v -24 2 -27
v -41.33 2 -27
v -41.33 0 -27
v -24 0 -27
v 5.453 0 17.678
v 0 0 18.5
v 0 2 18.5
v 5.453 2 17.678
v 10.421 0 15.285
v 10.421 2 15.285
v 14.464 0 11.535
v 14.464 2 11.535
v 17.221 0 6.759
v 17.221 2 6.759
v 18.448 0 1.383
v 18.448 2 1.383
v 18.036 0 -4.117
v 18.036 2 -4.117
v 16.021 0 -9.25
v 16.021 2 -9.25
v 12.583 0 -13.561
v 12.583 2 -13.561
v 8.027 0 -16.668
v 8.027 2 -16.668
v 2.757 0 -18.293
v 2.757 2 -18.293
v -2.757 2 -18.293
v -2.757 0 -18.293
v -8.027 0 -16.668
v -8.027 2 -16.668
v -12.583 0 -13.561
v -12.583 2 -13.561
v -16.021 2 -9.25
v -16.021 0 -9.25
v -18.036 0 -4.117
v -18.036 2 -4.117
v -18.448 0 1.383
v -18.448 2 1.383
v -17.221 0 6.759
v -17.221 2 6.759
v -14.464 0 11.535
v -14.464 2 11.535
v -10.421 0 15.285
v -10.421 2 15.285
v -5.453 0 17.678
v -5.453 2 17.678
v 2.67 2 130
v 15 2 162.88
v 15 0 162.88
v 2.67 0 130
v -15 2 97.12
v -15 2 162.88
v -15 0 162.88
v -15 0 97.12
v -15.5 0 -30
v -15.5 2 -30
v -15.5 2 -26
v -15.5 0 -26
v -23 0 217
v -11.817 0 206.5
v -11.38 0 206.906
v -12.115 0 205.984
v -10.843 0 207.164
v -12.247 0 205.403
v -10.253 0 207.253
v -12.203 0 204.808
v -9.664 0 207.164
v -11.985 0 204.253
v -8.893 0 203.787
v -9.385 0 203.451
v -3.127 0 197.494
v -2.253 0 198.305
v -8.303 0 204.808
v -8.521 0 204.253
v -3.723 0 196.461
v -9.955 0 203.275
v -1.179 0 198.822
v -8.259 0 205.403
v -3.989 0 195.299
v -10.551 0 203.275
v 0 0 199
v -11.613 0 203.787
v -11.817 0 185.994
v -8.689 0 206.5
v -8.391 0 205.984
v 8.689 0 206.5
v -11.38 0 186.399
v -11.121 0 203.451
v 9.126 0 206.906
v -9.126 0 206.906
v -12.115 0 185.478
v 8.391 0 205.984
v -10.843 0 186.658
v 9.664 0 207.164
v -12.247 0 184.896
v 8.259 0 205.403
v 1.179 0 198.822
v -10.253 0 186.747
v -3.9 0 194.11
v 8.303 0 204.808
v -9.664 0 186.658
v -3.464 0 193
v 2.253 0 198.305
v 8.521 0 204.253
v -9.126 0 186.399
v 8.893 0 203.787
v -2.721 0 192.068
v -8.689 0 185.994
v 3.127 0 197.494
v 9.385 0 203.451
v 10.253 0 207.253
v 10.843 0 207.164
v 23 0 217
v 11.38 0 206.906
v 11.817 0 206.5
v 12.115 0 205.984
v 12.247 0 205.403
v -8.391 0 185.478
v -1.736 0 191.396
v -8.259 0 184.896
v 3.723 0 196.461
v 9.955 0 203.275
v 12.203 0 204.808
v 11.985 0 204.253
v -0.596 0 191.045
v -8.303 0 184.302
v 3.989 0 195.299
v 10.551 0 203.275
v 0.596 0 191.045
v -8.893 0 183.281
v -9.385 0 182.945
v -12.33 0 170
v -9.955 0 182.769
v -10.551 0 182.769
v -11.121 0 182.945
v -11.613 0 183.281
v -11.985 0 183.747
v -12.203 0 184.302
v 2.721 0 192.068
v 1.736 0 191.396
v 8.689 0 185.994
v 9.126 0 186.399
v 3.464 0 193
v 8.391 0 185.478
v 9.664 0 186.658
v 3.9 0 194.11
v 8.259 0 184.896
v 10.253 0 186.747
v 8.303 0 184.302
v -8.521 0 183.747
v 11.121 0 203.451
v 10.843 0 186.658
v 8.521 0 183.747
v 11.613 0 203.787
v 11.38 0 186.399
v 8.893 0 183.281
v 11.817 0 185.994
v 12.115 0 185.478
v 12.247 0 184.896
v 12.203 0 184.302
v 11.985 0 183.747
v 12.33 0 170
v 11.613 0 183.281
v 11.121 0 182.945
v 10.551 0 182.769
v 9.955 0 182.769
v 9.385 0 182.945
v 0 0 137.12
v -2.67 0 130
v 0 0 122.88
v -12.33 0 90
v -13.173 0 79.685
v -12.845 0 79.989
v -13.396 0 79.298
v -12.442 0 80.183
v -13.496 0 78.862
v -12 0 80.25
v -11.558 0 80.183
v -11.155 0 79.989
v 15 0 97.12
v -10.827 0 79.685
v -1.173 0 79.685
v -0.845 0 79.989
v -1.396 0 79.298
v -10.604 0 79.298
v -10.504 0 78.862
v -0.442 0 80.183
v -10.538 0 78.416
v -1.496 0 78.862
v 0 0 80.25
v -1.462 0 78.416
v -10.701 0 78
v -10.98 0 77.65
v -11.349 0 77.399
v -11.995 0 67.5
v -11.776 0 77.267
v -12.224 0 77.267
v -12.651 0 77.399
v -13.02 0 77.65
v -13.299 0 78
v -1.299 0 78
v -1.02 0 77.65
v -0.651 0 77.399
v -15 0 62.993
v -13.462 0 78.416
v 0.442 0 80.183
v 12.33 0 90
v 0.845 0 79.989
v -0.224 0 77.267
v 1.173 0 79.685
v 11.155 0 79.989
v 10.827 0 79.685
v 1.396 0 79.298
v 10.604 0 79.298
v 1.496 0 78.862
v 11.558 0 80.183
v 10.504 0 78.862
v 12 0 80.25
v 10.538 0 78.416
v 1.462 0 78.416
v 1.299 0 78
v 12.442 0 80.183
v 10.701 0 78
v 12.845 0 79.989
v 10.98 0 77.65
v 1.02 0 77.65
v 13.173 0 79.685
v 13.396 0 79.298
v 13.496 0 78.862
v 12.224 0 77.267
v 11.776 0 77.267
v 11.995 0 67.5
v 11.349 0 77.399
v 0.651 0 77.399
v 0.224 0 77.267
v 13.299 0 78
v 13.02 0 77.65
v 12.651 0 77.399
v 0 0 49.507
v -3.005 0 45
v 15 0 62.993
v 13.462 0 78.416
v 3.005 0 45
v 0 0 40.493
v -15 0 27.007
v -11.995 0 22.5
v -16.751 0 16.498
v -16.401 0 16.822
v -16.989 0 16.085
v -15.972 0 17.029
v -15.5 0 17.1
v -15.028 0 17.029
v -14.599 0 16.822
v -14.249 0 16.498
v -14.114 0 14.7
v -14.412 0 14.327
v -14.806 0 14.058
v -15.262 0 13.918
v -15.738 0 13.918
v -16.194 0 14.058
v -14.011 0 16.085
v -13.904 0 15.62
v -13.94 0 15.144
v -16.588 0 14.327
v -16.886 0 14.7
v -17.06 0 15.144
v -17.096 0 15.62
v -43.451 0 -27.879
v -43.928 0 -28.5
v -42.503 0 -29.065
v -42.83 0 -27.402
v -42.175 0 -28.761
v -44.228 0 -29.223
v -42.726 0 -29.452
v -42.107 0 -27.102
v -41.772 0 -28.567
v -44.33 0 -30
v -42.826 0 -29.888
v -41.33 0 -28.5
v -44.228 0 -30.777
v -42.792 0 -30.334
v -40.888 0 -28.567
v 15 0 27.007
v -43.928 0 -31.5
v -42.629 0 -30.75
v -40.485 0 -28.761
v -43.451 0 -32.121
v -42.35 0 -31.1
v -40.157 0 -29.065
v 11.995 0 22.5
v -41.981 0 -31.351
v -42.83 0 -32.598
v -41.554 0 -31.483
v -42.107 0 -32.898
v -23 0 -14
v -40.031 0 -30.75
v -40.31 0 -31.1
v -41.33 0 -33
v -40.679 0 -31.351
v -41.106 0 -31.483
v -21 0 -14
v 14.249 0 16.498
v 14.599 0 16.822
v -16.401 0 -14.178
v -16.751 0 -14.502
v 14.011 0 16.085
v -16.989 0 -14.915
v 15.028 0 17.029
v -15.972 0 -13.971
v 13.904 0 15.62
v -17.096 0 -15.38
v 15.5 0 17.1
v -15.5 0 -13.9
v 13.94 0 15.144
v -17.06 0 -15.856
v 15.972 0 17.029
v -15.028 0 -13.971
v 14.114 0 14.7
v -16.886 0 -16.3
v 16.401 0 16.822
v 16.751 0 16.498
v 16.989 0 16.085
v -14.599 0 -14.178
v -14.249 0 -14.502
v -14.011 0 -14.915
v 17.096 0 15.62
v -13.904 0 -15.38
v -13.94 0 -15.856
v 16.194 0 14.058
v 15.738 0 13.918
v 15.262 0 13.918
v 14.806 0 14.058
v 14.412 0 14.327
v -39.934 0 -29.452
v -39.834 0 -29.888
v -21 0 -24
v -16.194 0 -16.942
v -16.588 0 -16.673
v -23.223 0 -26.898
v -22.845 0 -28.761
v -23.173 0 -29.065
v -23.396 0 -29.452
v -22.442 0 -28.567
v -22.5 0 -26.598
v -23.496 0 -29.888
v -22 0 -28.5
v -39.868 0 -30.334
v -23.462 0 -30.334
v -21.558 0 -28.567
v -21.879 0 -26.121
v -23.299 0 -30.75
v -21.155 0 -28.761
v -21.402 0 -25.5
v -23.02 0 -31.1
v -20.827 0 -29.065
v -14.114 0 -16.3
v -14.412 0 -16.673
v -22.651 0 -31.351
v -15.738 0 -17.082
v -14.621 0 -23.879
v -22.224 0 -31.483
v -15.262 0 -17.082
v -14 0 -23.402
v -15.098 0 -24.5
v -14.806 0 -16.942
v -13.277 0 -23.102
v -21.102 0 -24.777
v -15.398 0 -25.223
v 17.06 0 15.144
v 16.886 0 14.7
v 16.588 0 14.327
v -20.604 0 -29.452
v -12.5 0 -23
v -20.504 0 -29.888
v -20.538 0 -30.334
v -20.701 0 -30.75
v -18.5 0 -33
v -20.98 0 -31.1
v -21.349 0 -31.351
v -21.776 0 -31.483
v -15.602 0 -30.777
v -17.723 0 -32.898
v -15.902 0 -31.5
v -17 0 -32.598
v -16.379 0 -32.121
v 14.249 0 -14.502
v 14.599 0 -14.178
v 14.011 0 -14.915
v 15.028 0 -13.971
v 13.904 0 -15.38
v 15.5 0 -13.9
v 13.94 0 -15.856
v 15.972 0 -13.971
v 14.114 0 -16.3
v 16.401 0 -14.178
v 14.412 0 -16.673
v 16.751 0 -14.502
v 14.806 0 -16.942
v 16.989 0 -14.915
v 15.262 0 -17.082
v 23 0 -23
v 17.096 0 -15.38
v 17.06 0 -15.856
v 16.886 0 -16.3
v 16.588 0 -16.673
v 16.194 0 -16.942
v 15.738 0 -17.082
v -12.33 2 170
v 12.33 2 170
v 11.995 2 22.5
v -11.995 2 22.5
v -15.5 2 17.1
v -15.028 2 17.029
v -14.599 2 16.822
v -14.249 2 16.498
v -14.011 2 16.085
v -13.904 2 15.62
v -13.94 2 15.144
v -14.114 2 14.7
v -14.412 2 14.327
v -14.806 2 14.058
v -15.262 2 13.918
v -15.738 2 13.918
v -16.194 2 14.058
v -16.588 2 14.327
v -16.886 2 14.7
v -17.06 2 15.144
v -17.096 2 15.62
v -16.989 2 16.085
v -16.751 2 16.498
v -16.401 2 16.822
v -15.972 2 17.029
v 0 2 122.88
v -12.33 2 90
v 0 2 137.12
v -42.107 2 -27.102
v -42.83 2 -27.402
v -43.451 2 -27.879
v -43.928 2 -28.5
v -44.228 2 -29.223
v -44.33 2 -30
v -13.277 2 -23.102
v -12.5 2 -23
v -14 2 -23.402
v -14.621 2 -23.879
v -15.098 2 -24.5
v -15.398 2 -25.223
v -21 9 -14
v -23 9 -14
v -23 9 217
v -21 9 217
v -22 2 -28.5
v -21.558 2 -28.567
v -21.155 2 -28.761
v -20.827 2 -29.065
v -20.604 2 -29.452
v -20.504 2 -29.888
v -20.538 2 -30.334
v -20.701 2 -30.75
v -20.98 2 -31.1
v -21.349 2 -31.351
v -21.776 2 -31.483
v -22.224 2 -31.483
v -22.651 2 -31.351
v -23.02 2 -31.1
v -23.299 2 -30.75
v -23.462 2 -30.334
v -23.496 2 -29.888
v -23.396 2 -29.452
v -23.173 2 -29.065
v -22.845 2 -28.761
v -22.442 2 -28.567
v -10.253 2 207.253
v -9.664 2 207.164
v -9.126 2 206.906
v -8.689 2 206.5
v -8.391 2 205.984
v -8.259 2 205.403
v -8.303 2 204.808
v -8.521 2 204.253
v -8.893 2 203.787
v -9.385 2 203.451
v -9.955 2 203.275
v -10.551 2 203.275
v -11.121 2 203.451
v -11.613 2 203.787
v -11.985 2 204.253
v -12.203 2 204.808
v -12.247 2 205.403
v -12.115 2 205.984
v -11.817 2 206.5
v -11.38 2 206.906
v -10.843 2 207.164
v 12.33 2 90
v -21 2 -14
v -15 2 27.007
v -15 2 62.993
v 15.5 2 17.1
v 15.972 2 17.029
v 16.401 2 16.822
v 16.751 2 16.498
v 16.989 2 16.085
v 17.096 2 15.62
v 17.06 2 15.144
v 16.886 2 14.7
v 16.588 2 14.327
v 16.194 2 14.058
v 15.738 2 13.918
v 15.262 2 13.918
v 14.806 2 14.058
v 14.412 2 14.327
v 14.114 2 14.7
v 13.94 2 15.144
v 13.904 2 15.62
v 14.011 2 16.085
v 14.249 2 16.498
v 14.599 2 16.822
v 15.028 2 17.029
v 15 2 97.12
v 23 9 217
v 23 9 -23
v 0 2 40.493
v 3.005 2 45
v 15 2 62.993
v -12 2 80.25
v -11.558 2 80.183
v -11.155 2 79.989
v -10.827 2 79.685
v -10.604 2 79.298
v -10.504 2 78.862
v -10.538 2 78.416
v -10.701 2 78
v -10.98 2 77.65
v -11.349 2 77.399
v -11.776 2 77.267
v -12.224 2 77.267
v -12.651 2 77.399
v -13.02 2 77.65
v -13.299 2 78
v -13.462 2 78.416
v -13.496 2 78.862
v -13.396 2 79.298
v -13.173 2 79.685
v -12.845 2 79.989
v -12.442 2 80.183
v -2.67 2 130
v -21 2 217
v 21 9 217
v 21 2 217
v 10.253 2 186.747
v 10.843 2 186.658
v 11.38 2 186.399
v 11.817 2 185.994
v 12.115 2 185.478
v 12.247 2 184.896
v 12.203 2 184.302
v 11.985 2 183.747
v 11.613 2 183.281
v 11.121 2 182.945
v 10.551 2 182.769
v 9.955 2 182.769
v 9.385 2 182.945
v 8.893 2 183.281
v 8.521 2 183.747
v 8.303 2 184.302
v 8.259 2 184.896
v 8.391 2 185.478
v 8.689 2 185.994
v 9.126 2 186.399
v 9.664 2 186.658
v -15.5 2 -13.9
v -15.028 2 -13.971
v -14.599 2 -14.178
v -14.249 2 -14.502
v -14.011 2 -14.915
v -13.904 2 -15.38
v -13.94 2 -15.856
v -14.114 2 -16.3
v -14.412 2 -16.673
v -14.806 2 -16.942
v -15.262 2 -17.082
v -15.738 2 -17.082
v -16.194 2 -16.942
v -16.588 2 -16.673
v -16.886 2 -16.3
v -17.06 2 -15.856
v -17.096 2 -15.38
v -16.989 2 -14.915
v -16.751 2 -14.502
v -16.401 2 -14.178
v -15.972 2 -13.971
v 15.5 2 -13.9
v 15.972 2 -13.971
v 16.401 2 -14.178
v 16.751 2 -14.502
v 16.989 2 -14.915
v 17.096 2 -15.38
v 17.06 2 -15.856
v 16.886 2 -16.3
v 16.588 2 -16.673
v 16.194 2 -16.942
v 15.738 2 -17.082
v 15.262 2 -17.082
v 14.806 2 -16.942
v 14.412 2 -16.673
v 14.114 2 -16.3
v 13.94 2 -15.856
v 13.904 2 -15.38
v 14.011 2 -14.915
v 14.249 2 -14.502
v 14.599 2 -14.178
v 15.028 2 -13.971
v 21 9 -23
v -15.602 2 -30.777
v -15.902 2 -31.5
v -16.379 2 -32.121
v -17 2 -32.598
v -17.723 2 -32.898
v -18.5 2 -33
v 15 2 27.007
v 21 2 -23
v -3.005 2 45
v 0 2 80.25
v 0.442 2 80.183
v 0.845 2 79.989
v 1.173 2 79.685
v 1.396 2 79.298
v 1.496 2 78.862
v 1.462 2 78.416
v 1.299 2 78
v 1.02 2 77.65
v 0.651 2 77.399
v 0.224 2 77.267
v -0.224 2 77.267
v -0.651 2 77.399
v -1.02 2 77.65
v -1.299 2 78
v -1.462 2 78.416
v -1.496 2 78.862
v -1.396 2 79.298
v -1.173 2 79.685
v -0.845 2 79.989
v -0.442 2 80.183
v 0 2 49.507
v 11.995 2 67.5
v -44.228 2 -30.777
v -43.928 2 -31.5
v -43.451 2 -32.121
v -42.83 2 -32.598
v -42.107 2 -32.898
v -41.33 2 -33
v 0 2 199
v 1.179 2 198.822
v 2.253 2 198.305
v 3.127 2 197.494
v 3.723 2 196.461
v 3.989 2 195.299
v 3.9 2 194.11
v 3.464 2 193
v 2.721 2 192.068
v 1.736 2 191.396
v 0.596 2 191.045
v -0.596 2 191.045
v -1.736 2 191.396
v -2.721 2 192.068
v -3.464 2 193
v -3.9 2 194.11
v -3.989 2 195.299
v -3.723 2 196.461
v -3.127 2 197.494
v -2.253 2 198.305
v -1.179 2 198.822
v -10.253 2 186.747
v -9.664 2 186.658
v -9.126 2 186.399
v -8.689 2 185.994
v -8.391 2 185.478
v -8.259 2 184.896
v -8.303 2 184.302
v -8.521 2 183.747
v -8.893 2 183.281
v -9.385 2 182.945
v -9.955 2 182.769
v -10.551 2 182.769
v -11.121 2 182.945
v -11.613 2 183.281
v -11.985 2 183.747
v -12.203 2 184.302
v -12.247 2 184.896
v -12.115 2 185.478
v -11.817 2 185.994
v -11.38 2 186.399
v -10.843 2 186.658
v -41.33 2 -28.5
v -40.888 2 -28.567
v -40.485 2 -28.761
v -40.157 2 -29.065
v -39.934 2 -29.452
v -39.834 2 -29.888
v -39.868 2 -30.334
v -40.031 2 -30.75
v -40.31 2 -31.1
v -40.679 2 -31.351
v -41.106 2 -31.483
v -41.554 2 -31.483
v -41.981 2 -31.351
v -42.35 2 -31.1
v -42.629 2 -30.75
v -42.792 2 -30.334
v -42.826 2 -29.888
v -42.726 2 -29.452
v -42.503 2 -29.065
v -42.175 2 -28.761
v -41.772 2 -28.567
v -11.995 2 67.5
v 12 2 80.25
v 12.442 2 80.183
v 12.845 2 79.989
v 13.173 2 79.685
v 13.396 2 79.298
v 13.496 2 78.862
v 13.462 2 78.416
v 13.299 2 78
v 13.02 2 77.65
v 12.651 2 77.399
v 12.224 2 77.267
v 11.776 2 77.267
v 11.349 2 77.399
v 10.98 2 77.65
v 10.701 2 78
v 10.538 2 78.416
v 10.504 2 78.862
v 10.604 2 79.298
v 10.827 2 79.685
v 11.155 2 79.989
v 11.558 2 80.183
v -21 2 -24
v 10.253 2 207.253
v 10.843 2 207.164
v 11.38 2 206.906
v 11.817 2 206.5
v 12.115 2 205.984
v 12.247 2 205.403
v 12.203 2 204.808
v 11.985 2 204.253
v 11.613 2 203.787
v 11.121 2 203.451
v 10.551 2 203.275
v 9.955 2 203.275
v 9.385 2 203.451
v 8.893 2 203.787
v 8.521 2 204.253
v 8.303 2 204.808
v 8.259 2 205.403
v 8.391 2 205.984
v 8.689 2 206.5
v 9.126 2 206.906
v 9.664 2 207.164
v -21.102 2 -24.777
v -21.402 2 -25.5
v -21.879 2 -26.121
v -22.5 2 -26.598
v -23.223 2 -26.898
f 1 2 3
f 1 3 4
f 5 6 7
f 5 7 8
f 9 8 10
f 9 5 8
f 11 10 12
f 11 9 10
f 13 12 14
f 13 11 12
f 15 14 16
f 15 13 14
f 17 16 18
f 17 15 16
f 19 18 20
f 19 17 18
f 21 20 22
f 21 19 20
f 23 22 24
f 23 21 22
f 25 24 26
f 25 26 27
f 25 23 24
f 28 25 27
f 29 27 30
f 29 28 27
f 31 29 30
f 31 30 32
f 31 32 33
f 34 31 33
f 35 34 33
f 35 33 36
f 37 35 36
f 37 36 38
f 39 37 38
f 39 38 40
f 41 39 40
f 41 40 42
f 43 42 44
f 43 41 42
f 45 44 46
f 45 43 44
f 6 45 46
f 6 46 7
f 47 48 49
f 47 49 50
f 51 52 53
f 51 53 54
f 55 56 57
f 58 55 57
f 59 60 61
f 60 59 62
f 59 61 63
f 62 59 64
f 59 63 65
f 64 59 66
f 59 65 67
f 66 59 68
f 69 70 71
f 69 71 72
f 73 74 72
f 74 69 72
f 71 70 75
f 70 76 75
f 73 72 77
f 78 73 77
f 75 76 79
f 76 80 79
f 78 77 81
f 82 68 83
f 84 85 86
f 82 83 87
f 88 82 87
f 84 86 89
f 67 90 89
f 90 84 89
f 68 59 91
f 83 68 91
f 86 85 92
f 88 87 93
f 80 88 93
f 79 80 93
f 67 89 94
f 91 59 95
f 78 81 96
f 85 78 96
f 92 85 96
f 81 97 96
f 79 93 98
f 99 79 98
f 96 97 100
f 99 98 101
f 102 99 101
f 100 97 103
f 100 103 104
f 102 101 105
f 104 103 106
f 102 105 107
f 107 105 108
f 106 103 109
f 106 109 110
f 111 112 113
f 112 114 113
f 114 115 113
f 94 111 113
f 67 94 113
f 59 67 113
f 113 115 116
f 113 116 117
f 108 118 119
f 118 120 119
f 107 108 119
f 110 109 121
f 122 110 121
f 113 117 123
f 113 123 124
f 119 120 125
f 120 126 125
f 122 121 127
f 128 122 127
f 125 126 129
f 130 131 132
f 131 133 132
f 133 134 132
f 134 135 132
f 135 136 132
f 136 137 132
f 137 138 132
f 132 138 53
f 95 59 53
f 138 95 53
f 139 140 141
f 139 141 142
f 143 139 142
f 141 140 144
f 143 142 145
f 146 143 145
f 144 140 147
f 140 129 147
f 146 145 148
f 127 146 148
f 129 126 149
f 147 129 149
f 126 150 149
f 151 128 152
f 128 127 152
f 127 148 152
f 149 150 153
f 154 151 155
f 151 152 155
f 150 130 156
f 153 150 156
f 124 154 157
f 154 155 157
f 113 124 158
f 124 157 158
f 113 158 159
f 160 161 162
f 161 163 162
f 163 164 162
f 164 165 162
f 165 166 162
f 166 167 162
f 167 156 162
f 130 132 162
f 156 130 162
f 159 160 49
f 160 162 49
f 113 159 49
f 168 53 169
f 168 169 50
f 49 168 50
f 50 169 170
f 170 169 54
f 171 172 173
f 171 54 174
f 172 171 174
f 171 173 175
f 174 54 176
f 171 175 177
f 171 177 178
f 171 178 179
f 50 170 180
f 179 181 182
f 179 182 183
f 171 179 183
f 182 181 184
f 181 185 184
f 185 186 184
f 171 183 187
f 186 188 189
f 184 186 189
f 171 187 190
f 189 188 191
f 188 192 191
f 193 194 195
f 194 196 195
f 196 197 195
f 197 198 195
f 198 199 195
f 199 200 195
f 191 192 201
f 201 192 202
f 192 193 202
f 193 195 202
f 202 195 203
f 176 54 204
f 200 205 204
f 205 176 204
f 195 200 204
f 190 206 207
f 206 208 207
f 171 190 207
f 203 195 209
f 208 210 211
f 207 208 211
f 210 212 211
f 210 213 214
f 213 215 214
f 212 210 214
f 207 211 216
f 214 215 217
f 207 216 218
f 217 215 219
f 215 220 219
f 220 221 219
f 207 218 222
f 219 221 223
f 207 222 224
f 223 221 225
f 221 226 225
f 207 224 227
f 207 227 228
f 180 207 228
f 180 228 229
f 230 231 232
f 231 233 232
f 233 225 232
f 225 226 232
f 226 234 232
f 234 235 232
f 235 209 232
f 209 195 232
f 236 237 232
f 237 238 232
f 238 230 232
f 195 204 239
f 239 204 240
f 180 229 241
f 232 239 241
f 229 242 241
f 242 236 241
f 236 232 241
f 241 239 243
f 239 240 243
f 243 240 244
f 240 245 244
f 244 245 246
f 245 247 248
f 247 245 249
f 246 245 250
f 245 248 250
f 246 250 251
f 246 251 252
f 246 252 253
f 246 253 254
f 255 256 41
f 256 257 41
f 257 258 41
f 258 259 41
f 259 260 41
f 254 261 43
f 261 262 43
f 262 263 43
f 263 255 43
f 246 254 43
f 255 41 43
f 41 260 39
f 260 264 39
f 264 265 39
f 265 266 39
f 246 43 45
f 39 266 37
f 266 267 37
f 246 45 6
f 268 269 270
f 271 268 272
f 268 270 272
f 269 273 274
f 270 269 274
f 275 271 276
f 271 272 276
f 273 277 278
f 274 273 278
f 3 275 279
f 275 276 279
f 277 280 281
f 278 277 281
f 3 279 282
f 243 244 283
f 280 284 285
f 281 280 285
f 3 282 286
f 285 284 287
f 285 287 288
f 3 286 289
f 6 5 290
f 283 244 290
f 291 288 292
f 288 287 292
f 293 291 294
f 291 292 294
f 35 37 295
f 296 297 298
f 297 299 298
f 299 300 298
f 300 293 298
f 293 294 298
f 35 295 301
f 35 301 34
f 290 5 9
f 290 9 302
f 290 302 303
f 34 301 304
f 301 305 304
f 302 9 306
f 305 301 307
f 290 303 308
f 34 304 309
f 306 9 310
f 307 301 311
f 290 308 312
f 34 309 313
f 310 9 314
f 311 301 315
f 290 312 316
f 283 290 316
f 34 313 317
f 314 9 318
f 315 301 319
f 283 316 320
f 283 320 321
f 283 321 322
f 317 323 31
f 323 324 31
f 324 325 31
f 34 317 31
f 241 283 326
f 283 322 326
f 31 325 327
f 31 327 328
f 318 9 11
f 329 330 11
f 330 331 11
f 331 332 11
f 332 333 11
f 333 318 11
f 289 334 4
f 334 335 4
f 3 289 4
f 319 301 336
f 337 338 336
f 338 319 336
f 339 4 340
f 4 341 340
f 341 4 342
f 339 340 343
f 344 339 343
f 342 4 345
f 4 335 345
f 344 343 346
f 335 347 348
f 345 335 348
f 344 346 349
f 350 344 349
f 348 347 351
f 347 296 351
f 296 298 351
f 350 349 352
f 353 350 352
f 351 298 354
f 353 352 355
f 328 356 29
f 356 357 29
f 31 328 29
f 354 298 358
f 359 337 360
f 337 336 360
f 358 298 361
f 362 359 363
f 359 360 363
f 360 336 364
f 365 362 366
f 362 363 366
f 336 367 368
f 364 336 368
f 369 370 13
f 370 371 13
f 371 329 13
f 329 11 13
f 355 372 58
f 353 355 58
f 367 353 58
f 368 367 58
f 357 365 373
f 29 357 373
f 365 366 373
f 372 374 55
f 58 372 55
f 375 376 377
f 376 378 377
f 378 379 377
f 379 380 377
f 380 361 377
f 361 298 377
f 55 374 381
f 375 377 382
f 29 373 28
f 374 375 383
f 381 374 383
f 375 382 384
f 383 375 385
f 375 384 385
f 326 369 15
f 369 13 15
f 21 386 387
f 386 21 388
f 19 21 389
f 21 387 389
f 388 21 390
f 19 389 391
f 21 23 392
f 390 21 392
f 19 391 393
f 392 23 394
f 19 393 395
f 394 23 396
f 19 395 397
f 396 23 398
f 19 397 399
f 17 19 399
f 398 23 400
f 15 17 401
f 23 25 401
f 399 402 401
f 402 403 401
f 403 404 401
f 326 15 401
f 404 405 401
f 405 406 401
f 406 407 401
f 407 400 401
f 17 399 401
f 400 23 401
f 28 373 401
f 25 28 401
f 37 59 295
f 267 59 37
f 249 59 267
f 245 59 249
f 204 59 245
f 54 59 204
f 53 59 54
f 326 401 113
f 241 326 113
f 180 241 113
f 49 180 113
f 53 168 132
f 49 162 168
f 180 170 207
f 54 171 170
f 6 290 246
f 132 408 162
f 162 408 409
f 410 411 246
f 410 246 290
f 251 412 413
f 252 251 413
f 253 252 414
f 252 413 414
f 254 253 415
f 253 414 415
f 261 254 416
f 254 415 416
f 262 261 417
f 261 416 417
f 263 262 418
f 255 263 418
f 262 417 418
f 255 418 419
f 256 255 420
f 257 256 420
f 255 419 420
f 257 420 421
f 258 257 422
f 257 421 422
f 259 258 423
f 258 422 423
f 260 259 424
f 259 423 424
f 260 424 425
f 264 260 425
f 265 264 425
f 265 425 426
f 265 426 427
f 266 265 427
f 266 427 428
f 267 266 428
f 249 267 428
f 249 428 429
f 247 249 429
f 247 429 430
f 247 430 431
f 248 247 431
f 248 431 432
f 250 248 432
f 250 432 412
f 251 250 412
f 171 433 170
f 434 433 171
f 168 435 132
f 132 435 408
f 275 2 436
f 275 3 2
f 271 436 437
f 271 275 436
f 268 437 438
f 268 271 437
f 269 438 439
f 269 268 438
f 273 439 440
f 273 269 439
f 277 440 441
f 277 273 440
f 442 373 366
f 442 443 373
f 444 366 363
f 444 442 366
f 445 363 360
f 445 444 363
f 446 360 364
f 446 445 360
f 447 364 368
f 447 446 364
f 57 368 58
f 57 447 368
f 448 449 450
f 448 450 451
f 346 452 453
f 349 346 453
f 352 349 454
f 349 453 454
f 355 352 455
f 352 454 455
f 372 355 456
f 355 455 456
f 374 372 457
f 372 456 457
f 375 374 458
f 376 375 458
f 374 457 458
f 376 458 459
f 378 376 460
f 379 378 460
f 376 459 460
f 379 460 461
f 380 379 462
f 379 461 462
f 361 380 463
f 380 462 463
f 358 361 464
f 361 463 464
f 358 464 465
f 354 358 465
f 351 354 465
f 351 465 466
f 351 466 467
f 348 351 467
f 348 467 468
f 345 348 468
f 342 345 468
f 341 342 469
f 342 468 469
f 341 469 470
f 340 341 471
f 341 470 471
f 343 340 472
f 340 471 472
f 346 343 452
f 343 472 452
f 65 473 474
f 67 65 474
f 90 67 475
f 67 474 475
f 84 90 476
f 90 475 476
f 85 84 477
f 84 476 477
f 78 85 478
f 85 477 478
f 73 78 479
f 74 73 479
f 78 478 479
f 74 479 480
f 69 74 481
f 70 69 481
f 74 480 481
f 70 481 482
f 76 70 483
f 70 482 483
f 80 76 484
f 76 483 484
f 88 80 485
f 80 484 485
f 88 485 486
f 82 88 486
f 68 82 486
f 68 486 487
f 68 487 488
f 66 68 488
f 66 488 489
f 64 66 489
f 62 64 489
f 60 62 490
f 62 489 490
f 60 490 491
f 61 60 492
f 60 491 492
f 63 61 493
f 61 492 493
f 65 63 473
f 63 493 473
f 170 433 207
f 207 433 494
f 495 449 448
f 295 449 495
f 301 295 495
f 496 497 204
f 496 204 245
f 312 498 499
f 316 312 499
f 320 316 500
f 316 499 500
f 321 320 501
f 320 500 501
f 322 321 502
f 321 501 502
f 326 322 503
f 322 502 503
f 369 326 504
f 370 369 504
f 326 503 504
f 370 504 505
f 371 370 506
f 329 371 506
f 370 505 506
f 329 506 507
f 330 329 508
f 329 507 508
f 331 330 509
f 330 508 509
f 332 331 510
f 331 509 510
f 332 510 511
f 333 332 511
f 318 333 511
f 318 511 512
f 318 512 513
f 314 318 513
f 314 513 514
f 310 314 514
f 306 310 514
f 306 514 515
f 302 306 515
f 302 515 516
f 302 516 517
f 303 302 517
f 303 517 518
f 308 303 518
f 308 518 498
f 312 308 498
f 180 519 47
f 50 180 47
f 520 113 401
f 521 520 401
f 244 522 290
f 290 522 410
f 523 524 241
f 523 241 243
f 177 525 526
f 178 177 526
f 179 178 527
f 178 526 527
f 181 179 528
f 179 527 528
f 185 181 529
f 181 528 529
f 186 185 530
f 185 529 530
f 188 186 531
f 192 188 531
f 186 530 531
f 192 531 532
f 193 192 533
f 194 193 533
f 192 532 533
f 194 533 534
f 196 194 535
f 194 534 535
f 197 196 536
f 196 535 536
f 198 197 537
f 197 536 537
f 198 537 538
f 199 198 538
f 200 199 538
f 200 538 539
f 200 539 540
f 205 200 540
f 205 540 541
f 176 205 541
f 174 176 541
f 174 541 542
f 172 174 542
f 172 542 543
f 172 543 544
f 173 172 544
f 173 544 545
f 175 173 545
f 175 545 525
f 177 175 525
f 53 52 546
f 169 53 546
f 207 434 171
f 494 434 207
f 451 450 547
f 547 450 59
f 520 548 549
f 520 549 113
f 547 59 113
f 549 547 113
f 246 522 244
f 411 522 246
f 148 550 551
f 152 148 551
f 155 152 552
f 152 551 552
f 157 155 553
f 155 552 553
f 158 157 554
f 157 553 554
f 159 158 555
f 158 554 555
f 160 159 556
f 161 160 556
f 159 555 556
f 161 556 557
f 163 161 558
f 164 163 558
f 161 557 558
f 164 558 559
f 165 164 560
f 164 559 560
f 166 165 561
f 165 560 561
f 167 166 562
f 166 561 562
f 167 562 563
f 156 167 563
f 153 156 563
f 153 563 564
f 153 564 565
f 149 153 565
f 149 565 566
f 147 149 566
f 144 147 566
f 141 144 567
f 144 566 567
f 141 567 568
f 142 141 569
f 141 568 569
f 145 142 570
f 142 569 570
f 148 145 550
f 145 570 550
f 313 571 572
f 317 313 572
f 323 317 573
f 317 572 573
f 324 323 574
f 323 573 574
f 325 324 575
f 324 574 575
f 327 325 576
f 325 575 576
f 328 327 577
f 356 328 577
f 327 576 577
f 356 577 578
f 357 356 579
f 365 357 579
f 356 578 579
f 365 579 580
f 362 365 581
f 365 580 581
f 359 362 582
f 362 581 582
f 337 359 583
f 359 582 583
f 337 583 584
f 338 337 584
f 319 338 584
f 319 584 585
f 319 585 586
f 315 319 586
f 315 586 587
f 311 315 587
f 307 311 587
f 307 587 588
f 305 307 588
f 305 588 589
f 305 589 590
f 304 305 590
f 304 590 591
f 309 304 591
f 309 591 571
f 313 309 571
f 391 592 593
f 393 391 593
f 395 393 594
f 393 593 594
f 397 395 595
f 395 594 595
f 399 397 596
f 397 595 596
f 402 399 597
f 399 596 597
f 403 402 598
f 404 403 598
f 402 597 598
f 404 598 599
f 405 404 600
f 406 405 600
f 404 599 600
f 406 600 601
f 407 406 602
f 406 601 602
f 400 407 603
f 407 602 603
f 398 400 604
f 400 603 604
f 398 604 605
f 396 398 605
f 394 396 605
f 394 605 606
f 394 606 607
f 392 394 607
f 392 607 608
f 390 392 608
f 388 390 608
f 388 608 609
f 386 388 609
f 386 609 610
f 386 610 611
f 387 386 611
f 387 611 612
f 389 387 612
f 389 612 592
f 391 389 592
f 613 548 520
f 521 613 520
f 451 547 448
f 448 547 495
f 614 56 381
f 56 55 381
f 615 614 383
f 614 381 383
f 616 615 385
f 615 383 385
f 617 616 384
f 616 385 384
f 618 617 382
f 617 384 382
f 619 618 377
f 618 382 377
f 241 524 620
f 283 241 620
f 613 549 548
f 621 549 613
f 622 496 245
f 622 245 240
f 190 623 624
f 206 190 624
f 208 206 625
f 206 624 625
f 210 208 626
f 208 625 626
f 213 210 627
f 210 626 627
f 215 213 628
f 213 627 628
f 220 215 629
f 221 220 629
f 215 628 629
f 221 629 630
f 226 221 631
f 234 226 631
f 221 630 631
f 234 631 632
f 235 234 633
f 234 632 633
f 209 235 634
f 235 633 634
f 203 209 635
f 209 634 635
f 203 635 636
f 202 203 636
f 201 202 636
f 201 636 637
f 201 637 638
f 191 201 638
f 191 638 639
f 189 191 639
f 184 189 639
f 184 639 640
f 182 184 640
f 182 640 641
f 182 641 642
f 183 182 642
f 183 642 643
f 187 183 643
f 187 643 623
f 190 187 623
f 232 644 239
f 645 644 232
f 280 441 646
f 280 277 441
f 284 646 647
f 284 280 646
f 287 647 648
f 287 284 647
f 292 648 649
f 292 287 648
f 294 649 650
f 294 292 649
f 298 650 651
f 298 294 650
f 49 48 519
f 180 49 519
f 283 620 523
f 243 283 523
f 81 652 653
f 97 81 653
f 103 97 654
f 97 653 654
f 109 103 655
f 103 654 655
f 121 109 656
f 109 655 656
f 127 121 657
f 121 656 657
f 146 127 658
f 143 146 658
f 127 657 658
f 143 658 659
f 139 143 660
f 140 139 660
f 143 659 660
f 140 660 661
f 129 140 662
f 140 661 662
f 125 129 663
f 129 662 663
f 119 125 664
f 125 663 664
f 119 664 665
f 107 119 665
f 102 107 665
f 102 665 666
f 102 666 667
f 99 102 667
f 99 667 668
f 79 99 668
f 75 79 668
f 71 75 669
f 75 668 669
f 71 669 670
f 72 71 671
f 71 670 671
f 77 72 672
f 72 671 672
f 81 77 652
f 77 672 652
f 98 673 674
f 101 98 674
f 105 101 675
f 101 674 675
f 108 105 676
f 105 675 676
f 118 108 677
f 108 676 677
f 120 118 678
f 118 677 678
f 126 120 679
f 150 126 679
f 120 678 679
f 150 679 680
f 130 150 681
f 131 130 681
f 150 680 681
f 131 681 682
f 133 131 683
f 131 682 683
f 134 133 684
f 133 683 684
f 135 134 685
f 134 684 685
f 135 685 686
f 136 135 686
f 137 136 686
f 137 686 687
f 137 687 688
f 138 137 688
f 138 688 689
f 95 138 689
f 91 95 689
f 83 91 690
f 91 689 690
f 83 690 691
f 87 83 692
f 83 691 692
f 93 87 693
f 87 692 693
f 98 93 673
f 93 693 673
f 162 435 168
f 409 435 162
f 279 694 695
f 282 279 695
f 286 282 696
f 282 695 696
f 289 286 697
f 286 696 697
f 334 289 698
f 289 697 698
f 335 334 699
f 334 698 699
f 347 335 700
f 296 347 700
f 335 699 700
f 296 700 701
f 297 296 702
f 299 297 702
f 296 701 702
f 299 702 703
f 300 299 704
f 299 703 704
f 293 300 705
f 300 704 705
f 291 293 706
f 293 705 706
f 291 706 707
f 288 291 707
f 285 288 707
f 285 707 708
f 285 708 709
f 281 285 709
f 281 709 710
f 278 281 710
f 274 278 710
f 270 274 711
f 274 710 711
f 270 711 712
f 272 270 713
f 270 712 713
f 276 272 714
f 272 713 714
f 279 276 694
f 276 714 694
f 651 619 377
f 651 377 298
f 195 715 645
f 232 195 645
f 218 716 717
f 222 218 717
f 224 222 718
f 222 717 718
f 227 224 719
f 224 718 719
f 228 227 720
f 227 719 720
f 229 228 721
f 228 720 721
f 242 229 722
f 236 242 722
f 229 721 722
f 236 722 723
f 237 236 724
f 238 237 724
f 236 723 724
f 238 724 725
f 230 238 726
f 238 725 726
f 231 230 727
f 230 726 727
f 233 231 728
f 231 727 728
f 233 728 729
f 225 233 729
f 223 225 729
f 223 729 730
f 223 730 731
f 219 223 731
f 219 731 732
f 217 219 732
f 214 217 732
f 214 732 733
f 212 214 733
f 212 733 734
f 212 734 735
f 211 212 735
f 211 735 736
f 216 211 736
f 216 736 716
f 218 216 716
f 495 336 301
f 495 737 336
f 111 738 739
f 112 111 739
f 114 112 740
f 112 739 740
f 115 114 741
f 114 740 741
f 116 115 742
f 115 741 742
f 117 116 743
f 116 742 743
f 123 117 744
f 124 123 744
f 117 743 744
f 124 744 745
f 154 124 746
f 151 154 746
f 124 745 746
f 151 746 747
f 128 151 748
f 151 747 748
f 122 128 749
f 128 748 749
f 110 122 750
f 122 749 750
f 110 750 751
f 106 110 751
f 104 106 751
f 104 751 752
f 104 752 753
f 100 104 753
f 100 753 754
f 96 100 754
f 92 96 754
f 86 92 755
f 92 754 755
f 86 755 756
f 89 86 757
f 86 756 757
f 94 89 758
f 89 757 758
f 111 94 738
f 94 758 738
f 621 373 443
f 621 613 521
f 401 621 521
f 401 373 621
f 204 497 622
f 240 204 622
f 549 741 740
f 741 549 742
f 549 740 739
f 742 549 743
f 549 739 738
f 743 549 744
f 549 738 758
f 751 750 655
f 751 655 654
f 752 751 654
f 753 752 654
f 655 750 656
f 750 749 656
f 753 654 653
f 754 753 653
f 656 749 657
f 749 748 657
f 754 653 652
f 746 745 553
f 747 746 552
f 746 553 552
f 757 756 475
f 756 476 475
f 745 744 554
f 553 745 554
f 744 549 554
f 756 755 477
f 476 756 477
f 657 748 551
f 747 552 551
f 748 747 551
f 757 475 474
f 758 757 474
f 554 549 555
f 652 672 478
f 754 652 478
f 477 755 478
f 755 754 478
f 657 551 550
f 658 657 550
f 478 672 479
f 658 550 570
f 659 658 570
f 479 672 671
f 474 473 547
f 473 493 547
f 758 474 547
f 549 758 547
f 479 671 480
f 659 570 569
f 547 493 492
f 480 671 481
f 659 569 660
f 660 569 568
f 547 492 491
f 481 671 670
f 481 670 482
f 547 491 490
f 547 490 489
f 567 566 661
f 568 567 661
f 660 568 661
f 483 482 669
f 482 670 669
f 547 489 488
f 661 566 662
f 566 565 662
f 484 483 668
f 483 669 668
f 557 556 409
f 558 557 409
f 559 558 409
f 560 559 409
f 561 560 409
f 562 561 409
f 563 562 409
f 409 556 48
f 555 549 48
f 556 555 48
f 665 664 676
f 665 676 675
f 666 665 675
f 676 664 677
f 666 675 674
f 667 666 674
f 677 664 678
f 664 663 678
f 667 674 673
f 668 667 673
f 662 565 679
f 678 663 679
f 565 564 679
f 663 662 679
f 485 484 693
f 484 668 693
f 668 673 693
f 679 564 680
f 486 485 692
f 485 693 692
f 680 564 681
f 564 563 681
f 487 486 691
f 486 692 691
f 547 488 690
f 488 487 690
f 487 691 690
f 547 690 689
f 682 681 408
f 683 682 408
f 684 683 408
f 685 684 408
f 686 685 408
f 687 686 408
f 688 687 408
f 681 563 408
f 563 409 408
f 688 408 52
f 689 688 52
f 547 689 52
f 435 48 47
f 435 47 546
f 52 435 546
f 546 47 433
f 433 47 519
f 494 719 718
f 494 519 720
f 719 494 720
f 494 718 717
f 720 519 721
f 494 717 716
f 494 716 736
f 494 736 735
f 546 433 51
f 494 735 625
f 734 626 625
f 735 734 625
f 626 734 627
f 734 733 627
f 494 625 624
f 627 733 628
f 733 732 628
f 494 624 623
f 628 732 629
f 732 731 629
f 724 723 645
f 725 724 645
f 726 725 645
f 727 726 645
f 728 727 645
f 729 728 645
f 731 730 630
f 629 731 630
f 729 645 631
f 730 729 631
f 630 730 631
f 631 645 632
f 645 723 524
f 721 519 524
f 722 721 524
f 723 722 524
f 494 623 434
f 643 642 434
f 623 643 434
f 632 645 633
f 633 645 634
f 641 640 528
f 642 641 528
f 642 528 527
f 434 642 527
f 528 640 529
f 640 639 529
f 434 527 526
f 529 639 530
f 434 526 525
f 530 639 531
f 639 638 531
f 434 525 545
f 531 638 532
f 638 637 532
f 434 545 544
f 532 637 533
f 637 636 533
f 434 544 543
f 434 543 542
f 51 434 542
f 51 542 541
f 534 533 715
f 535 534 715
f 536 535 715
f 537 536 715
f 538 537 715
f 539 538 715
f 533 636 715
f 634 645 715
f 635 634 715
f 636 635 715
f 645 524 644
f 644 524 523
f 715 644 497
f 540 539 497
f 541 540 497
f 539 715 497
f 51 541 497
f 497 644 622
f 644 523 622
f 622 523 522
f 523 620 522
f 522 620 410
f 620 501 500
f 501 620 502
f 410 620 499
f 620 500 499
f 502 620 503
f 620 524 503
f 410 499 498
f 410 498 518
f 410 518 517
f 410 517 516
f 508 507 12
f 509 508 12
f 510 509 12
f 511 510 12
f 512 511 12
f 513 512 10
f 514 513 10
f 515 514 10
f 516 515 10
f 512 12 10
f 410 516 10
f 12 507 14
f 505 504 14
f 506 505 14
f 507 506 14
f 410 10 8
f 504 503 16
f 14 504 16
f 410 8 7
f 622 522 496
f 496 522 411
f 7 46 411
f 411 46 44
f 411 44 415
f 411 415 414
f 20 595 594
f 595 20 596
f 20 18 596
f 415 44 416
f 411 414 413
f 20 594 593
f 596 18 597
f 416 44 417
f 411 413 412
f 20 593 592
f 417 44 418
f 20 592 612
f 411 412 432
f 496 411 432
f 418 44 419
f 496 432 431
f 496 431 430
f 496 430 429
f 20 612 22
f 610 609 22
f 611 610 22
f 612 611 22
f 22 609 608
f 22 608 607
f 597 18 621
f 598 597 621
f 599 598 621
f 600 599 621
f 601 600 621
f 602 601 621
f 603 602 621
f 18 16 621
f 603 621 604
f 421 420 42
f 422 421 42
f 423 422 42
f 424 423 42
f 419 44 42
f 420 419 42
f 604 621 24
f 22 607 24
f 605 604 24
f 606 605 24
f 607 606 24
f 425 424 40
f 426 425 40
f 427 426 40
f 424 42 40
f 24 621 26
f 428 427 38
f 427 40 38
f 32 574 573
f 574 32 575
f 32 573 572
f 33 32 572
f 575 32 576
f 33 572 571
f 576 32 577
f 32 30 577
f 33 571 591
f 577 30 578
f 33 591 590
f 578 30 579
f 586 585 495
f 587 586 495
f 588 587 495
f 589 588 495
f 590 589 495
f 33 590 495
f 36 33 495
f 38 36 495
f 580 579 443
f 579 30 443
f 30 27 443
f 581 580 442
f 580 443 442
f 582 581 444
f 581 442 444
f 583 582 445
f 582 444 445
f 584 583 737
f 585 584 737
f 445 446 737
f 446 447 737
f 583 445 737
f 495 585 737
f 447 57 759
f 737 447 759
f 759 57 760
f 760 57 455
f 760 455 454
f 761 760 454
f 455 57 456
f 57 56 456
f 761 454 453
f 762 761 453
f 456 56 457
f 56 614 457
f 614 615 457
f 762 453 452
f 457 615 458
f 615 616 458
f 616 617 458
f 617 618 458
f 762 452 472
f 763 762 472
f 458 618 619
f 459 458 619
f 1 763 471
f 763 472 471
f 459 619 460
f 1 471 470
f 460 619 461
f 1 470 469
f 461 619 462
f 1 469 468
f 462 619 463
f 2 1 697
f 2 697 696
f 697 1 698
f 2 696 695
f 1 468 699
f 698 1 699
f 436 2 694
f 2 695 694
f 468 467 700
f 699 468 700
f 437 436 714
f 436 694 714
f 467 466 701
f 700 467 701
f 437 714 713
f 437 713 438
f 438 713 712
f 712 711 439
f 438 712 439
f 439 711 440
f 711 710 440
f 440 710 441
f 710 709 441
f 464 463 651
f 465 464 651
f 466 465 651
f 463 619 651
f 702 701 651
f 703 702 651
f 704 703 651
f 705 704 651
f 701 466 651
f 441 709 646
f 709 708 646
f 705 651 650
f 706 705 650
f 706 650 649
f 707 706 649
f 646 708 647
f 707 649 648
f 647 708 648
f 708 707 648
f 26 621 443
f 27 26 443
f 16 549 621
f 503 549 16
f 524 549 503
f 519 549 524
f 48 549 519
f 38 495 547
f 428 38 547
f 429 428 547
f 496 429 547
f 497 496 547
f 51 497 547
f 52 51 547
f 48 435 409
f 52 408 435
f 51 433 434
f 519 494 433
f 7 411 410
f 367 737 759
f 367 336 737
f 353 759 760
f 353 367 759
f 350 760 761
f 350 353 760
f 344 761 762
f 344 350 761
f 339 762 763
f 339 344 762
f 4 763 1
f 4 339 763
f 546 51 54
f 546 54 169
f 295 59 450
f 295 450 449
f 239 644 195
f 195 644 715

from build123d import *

# Parameters (mm, degrees)
SKETCH_2_W           = 42
SKETCH_2_H           = 46
SKETCH_2_R           = 18.5
EXTRUDE_1_DEPTH      = 2
FILLET_1_R           = 5.5
SKETCH_3_R           = 1.6
CUT_EXTRUDE_1_DEPTH  = 32.208973069
SKETCH_4_R           = 4
SKETCH_4_R_2         = 2
EXTRUDE_2_DEPTH      = 2
SKETCH_7_R           = 1.5
EXTRUDE_4_DEPTH      = 2
EXTRUDE_5_DEPTH      = 7
EXTRUDE_5_DEPTH_BACK = 2
SKETCH_9_W           = 2
SKETCH_9_H           = 231
SKETCH_9_H_2         = 240
SKETCH_12_W          = 30
SKETCH_12_H          = 45
SKETCH_12_H_2        = 80
CUT_EXTRUDE_4_DEPTH  = 222.592303341
EXTRUDE_6_DEPTH      = 2
EXTRUDE_7_DEPTH      = 2
FILLET_2_R           = 3
SKETCH_15_R          = 1.5
CUT_EXTRUDE_5_DEPTH  = 222.592303341


with BuildPart() as part:
    # 草图2 → 凸台-拉伸1 (new body)
    with BuildSketch(Plane(origin=(0, 0, 0), x_dir=(1, 0, 0), z_dir=(0, 1, 0))):
        Rectangle(SKETCH_2_W, SKETCH_2_H)
        with Locations(Location((0, 0, 0), (0, 0, 270))):
            Circle(SKETCH_2_R, mode=Mode.SUBTRACT)
    extrude(amount=EXTRUDE_1_DEPTH)

    # 圆角1
    fillet_1_edges = [part.edges().sort_by_distance(p)[0] for p in [
        (-21, 1, -23),
    ]]
    fillet(fillet_1_edges, radius=FILLET_1_R)

    # 草图3 → 切除-拉伸1 (cut, through all)
    with BuildSketch(Plane(origin=(0, 2, 0), x_dir=(1, 0, 0), z_dir=(0, 1, 0))):
        with Locations(Location((-15.5, 15.5, 0), (0, 0, 270))):
            Circle(SKETCH_3_R)
        with Locations(Location((15.5, 15.5, 0), (0, 0, 270))):
            Circle(SKETCH_3_R)
        with Locations(Location((-15.5, -15.5, 0), (0, 0, 270))):
            Circle(SKETCH_3_R)
        with Locations(Location((15.5, -15.5, 0), (0, 0, 270))):
            Circle(SKETCH_3_R)
    extrude(amount=-CUT_EXTRUDE_1_DEPTH, mode=Mode.SUBTRACT)

    # 草图4 → 凸台-拉伸2 (add)
    with BuildSketch(Plane(origin=(0, 2, 0), x_dir=(1, 0, 0), z_dir=(0, 1, 0))):
        Polygon((-21, -23), (21, -23), (21, -176), (21, -217), (-21, -217), (-21, -176), align=None)
        with Locations(Location((0, -195, 0), (0, 0, 270))):
            Circle(SKETCH_4_R, mode=Mode.SUBTRACT)
        with Locations(Location((10.253048327, -184.746951673, 0), (0, 0, 270))):
            Circle(SKETCH_4_R_2, mode=Mode.SUBTRACT)
        with Locations(Location((-10.253048327, -184.746951673, 0), (0, 0, 270))):
            Circle(SKETCH_4_R_2, mode=Mode.SUBTRACT)
        with Locations(Location((10.253048327, -205.253048327, 0), (0, 0, 270))):
            Circle(SKETCH_4_R_2, mode=Mode.SUBTRACT)
        with Locations(Location((-10.253048327, -205.253048327, 0), (0, 0, 270))):
            Circle(SKETCH_4_R_2, mode=Mode.SUBTRACT)
    extrude(amount=-EXTRUDE_2_DEPTH)

    # 草图7 → 凸台-拉伸4 (add)
    with BuildSketch(Plane(origin=(0, 2, 0), x_dir=(1, 0, 0), z_dir=(0, 1, 0))):
        Polygon((-15.5, 23), (-21, 17), (-21, 27), (-41.33, 27), (-44.33, 27), (-44.33, 33), (-41.33, 33), (-15.5, 33), align=None)
        with Locations(Location((-41.33, 30, 0), (0, 0, 270))):
            Circle(SKETCH_7_R, mode=Mode.SUBTRACT)
        with Locations(Location((-22, 30, 0), (0, 0, 270))):
            Circle(SKETCH_7_R, mode=Mode.SUBTRACT)
    extrude(amount=-EXTRUDE_4_DEPTH)

    # 草图9 → 凸台-拉伸5 (add, two sides: drawn at the far end of the back side and taken through both)
    with BuildSketch(Plane(origin=(0, 2, 0), x_dir=(1, 0, 0), z_dir=(0, 1, 0)).offset(-EXTRUDE_5_DEPTH_BACK)):
        with Locations((-22, -101.5)):
            Rectangle(SKETCH_9_W, SKETCH_9_H)
        with Locations((22, -97)):
            Rectangle(SKETCH_9_W, SKETCH_9_H_2)
    extrude(amount=EXTRUDE_5_DEPTH + EXTRUDE_5_DEPTH_BACK)

    # 草图12 → 切除-拉伸4 (cut, through all)
    with BuildSketch(Plane(origin=(0, 2, 0), x_dir=(1, 0, 0), z_dir=(0, 1, 0))):
        with Locations((0, -45)):
            Rectangle(SKETCH_12_W, SKETCH_12_H)
        with Locations((0, -130)):
            Rectangle(SKETCH_12_W, SKETCH_12_H_2)
    extrude(amount=-CUT_EXTRUDE_4_DEPTH, mode=Mode.SUBTRACT)

    # 草图13 → 凸台-拉伸6 (add)
    with BuildSketch(Plane(origin=(0, 2, 0), x_dir=(1, 0, 0), z_dir=(0, 1, 0))):
        Polygon((-17.080125736, -23.886750491), (12.919874264, -68.886750491), (17.080125736, -66.113249509), (-12.919874264, -21.113249509), align=None)
        Polygon((-17.340822944, -90.877808604), (12.659177056, -170.877808604), (17.340822944, -169.122191396), (-12.659177056, -89.122191396), align=None)
    extrude(amount=-EXTRUDE_6_DEPTH)

    # 草图14 → 凸台-拉伸7 (add)
    with BuildSketch(Plane(origin=(0, 2, 0), x_dir=(1, 0, 0), z_dir=(0, 1, 0))):
        Polygon((-17.080125736, -66.113249509), (12.919874264, -21.113249509), (17.080125736, -23.886750491), (-12.919874264, -68.886750491), align=None)
        Polygon((-17.340822944, -169.122191396), (12.659177056, -89.122191396), (17.340822944, -90.877808604), (-12.659177056, -170.877808604), align=None)
    extrude(amount=-EXTRUDE_7_DEPTH)

    # 圆角2
    fillet_2_edges = [part.edges().sort_by_distance(p)[0] for p in [
        (-15.5, 1, -23),
        (-15.5, 1, -33),
        (-21, 1, -27),
        (-44.33, 1, -27),
        (-44.33, 1, -33),
    ]]
    fillet(fillet_2_edges, radius=FILLET_2_R - 0.0001)  # a hair under: the kernel refuses the full size

    # 草图15 → 切除-拉伸5 (cut, through all)
    with BuildSketch(Plane(origin=(0, 2, 0), x_dir=(1, 0, 0), z_dir=(0, 1, 0))):
        with Locations(Location((0, -78.75, 0), (0, 0, 270))):
            Circle(SKETCH_15_R)
        with Locations(Location((12, -78.75, 0), (0, 0, 270))):
            Circle(SKETCH_15_R)
        with Locations(Location((-12, -78.75, 0), (0, 0, 270))):
            Circle(SKETCH_15_R)
    extrude(amount=-CUT_EXTRUDE_5_DEPTH, mode=Mode.SUBTRACT)


solid = part.part
